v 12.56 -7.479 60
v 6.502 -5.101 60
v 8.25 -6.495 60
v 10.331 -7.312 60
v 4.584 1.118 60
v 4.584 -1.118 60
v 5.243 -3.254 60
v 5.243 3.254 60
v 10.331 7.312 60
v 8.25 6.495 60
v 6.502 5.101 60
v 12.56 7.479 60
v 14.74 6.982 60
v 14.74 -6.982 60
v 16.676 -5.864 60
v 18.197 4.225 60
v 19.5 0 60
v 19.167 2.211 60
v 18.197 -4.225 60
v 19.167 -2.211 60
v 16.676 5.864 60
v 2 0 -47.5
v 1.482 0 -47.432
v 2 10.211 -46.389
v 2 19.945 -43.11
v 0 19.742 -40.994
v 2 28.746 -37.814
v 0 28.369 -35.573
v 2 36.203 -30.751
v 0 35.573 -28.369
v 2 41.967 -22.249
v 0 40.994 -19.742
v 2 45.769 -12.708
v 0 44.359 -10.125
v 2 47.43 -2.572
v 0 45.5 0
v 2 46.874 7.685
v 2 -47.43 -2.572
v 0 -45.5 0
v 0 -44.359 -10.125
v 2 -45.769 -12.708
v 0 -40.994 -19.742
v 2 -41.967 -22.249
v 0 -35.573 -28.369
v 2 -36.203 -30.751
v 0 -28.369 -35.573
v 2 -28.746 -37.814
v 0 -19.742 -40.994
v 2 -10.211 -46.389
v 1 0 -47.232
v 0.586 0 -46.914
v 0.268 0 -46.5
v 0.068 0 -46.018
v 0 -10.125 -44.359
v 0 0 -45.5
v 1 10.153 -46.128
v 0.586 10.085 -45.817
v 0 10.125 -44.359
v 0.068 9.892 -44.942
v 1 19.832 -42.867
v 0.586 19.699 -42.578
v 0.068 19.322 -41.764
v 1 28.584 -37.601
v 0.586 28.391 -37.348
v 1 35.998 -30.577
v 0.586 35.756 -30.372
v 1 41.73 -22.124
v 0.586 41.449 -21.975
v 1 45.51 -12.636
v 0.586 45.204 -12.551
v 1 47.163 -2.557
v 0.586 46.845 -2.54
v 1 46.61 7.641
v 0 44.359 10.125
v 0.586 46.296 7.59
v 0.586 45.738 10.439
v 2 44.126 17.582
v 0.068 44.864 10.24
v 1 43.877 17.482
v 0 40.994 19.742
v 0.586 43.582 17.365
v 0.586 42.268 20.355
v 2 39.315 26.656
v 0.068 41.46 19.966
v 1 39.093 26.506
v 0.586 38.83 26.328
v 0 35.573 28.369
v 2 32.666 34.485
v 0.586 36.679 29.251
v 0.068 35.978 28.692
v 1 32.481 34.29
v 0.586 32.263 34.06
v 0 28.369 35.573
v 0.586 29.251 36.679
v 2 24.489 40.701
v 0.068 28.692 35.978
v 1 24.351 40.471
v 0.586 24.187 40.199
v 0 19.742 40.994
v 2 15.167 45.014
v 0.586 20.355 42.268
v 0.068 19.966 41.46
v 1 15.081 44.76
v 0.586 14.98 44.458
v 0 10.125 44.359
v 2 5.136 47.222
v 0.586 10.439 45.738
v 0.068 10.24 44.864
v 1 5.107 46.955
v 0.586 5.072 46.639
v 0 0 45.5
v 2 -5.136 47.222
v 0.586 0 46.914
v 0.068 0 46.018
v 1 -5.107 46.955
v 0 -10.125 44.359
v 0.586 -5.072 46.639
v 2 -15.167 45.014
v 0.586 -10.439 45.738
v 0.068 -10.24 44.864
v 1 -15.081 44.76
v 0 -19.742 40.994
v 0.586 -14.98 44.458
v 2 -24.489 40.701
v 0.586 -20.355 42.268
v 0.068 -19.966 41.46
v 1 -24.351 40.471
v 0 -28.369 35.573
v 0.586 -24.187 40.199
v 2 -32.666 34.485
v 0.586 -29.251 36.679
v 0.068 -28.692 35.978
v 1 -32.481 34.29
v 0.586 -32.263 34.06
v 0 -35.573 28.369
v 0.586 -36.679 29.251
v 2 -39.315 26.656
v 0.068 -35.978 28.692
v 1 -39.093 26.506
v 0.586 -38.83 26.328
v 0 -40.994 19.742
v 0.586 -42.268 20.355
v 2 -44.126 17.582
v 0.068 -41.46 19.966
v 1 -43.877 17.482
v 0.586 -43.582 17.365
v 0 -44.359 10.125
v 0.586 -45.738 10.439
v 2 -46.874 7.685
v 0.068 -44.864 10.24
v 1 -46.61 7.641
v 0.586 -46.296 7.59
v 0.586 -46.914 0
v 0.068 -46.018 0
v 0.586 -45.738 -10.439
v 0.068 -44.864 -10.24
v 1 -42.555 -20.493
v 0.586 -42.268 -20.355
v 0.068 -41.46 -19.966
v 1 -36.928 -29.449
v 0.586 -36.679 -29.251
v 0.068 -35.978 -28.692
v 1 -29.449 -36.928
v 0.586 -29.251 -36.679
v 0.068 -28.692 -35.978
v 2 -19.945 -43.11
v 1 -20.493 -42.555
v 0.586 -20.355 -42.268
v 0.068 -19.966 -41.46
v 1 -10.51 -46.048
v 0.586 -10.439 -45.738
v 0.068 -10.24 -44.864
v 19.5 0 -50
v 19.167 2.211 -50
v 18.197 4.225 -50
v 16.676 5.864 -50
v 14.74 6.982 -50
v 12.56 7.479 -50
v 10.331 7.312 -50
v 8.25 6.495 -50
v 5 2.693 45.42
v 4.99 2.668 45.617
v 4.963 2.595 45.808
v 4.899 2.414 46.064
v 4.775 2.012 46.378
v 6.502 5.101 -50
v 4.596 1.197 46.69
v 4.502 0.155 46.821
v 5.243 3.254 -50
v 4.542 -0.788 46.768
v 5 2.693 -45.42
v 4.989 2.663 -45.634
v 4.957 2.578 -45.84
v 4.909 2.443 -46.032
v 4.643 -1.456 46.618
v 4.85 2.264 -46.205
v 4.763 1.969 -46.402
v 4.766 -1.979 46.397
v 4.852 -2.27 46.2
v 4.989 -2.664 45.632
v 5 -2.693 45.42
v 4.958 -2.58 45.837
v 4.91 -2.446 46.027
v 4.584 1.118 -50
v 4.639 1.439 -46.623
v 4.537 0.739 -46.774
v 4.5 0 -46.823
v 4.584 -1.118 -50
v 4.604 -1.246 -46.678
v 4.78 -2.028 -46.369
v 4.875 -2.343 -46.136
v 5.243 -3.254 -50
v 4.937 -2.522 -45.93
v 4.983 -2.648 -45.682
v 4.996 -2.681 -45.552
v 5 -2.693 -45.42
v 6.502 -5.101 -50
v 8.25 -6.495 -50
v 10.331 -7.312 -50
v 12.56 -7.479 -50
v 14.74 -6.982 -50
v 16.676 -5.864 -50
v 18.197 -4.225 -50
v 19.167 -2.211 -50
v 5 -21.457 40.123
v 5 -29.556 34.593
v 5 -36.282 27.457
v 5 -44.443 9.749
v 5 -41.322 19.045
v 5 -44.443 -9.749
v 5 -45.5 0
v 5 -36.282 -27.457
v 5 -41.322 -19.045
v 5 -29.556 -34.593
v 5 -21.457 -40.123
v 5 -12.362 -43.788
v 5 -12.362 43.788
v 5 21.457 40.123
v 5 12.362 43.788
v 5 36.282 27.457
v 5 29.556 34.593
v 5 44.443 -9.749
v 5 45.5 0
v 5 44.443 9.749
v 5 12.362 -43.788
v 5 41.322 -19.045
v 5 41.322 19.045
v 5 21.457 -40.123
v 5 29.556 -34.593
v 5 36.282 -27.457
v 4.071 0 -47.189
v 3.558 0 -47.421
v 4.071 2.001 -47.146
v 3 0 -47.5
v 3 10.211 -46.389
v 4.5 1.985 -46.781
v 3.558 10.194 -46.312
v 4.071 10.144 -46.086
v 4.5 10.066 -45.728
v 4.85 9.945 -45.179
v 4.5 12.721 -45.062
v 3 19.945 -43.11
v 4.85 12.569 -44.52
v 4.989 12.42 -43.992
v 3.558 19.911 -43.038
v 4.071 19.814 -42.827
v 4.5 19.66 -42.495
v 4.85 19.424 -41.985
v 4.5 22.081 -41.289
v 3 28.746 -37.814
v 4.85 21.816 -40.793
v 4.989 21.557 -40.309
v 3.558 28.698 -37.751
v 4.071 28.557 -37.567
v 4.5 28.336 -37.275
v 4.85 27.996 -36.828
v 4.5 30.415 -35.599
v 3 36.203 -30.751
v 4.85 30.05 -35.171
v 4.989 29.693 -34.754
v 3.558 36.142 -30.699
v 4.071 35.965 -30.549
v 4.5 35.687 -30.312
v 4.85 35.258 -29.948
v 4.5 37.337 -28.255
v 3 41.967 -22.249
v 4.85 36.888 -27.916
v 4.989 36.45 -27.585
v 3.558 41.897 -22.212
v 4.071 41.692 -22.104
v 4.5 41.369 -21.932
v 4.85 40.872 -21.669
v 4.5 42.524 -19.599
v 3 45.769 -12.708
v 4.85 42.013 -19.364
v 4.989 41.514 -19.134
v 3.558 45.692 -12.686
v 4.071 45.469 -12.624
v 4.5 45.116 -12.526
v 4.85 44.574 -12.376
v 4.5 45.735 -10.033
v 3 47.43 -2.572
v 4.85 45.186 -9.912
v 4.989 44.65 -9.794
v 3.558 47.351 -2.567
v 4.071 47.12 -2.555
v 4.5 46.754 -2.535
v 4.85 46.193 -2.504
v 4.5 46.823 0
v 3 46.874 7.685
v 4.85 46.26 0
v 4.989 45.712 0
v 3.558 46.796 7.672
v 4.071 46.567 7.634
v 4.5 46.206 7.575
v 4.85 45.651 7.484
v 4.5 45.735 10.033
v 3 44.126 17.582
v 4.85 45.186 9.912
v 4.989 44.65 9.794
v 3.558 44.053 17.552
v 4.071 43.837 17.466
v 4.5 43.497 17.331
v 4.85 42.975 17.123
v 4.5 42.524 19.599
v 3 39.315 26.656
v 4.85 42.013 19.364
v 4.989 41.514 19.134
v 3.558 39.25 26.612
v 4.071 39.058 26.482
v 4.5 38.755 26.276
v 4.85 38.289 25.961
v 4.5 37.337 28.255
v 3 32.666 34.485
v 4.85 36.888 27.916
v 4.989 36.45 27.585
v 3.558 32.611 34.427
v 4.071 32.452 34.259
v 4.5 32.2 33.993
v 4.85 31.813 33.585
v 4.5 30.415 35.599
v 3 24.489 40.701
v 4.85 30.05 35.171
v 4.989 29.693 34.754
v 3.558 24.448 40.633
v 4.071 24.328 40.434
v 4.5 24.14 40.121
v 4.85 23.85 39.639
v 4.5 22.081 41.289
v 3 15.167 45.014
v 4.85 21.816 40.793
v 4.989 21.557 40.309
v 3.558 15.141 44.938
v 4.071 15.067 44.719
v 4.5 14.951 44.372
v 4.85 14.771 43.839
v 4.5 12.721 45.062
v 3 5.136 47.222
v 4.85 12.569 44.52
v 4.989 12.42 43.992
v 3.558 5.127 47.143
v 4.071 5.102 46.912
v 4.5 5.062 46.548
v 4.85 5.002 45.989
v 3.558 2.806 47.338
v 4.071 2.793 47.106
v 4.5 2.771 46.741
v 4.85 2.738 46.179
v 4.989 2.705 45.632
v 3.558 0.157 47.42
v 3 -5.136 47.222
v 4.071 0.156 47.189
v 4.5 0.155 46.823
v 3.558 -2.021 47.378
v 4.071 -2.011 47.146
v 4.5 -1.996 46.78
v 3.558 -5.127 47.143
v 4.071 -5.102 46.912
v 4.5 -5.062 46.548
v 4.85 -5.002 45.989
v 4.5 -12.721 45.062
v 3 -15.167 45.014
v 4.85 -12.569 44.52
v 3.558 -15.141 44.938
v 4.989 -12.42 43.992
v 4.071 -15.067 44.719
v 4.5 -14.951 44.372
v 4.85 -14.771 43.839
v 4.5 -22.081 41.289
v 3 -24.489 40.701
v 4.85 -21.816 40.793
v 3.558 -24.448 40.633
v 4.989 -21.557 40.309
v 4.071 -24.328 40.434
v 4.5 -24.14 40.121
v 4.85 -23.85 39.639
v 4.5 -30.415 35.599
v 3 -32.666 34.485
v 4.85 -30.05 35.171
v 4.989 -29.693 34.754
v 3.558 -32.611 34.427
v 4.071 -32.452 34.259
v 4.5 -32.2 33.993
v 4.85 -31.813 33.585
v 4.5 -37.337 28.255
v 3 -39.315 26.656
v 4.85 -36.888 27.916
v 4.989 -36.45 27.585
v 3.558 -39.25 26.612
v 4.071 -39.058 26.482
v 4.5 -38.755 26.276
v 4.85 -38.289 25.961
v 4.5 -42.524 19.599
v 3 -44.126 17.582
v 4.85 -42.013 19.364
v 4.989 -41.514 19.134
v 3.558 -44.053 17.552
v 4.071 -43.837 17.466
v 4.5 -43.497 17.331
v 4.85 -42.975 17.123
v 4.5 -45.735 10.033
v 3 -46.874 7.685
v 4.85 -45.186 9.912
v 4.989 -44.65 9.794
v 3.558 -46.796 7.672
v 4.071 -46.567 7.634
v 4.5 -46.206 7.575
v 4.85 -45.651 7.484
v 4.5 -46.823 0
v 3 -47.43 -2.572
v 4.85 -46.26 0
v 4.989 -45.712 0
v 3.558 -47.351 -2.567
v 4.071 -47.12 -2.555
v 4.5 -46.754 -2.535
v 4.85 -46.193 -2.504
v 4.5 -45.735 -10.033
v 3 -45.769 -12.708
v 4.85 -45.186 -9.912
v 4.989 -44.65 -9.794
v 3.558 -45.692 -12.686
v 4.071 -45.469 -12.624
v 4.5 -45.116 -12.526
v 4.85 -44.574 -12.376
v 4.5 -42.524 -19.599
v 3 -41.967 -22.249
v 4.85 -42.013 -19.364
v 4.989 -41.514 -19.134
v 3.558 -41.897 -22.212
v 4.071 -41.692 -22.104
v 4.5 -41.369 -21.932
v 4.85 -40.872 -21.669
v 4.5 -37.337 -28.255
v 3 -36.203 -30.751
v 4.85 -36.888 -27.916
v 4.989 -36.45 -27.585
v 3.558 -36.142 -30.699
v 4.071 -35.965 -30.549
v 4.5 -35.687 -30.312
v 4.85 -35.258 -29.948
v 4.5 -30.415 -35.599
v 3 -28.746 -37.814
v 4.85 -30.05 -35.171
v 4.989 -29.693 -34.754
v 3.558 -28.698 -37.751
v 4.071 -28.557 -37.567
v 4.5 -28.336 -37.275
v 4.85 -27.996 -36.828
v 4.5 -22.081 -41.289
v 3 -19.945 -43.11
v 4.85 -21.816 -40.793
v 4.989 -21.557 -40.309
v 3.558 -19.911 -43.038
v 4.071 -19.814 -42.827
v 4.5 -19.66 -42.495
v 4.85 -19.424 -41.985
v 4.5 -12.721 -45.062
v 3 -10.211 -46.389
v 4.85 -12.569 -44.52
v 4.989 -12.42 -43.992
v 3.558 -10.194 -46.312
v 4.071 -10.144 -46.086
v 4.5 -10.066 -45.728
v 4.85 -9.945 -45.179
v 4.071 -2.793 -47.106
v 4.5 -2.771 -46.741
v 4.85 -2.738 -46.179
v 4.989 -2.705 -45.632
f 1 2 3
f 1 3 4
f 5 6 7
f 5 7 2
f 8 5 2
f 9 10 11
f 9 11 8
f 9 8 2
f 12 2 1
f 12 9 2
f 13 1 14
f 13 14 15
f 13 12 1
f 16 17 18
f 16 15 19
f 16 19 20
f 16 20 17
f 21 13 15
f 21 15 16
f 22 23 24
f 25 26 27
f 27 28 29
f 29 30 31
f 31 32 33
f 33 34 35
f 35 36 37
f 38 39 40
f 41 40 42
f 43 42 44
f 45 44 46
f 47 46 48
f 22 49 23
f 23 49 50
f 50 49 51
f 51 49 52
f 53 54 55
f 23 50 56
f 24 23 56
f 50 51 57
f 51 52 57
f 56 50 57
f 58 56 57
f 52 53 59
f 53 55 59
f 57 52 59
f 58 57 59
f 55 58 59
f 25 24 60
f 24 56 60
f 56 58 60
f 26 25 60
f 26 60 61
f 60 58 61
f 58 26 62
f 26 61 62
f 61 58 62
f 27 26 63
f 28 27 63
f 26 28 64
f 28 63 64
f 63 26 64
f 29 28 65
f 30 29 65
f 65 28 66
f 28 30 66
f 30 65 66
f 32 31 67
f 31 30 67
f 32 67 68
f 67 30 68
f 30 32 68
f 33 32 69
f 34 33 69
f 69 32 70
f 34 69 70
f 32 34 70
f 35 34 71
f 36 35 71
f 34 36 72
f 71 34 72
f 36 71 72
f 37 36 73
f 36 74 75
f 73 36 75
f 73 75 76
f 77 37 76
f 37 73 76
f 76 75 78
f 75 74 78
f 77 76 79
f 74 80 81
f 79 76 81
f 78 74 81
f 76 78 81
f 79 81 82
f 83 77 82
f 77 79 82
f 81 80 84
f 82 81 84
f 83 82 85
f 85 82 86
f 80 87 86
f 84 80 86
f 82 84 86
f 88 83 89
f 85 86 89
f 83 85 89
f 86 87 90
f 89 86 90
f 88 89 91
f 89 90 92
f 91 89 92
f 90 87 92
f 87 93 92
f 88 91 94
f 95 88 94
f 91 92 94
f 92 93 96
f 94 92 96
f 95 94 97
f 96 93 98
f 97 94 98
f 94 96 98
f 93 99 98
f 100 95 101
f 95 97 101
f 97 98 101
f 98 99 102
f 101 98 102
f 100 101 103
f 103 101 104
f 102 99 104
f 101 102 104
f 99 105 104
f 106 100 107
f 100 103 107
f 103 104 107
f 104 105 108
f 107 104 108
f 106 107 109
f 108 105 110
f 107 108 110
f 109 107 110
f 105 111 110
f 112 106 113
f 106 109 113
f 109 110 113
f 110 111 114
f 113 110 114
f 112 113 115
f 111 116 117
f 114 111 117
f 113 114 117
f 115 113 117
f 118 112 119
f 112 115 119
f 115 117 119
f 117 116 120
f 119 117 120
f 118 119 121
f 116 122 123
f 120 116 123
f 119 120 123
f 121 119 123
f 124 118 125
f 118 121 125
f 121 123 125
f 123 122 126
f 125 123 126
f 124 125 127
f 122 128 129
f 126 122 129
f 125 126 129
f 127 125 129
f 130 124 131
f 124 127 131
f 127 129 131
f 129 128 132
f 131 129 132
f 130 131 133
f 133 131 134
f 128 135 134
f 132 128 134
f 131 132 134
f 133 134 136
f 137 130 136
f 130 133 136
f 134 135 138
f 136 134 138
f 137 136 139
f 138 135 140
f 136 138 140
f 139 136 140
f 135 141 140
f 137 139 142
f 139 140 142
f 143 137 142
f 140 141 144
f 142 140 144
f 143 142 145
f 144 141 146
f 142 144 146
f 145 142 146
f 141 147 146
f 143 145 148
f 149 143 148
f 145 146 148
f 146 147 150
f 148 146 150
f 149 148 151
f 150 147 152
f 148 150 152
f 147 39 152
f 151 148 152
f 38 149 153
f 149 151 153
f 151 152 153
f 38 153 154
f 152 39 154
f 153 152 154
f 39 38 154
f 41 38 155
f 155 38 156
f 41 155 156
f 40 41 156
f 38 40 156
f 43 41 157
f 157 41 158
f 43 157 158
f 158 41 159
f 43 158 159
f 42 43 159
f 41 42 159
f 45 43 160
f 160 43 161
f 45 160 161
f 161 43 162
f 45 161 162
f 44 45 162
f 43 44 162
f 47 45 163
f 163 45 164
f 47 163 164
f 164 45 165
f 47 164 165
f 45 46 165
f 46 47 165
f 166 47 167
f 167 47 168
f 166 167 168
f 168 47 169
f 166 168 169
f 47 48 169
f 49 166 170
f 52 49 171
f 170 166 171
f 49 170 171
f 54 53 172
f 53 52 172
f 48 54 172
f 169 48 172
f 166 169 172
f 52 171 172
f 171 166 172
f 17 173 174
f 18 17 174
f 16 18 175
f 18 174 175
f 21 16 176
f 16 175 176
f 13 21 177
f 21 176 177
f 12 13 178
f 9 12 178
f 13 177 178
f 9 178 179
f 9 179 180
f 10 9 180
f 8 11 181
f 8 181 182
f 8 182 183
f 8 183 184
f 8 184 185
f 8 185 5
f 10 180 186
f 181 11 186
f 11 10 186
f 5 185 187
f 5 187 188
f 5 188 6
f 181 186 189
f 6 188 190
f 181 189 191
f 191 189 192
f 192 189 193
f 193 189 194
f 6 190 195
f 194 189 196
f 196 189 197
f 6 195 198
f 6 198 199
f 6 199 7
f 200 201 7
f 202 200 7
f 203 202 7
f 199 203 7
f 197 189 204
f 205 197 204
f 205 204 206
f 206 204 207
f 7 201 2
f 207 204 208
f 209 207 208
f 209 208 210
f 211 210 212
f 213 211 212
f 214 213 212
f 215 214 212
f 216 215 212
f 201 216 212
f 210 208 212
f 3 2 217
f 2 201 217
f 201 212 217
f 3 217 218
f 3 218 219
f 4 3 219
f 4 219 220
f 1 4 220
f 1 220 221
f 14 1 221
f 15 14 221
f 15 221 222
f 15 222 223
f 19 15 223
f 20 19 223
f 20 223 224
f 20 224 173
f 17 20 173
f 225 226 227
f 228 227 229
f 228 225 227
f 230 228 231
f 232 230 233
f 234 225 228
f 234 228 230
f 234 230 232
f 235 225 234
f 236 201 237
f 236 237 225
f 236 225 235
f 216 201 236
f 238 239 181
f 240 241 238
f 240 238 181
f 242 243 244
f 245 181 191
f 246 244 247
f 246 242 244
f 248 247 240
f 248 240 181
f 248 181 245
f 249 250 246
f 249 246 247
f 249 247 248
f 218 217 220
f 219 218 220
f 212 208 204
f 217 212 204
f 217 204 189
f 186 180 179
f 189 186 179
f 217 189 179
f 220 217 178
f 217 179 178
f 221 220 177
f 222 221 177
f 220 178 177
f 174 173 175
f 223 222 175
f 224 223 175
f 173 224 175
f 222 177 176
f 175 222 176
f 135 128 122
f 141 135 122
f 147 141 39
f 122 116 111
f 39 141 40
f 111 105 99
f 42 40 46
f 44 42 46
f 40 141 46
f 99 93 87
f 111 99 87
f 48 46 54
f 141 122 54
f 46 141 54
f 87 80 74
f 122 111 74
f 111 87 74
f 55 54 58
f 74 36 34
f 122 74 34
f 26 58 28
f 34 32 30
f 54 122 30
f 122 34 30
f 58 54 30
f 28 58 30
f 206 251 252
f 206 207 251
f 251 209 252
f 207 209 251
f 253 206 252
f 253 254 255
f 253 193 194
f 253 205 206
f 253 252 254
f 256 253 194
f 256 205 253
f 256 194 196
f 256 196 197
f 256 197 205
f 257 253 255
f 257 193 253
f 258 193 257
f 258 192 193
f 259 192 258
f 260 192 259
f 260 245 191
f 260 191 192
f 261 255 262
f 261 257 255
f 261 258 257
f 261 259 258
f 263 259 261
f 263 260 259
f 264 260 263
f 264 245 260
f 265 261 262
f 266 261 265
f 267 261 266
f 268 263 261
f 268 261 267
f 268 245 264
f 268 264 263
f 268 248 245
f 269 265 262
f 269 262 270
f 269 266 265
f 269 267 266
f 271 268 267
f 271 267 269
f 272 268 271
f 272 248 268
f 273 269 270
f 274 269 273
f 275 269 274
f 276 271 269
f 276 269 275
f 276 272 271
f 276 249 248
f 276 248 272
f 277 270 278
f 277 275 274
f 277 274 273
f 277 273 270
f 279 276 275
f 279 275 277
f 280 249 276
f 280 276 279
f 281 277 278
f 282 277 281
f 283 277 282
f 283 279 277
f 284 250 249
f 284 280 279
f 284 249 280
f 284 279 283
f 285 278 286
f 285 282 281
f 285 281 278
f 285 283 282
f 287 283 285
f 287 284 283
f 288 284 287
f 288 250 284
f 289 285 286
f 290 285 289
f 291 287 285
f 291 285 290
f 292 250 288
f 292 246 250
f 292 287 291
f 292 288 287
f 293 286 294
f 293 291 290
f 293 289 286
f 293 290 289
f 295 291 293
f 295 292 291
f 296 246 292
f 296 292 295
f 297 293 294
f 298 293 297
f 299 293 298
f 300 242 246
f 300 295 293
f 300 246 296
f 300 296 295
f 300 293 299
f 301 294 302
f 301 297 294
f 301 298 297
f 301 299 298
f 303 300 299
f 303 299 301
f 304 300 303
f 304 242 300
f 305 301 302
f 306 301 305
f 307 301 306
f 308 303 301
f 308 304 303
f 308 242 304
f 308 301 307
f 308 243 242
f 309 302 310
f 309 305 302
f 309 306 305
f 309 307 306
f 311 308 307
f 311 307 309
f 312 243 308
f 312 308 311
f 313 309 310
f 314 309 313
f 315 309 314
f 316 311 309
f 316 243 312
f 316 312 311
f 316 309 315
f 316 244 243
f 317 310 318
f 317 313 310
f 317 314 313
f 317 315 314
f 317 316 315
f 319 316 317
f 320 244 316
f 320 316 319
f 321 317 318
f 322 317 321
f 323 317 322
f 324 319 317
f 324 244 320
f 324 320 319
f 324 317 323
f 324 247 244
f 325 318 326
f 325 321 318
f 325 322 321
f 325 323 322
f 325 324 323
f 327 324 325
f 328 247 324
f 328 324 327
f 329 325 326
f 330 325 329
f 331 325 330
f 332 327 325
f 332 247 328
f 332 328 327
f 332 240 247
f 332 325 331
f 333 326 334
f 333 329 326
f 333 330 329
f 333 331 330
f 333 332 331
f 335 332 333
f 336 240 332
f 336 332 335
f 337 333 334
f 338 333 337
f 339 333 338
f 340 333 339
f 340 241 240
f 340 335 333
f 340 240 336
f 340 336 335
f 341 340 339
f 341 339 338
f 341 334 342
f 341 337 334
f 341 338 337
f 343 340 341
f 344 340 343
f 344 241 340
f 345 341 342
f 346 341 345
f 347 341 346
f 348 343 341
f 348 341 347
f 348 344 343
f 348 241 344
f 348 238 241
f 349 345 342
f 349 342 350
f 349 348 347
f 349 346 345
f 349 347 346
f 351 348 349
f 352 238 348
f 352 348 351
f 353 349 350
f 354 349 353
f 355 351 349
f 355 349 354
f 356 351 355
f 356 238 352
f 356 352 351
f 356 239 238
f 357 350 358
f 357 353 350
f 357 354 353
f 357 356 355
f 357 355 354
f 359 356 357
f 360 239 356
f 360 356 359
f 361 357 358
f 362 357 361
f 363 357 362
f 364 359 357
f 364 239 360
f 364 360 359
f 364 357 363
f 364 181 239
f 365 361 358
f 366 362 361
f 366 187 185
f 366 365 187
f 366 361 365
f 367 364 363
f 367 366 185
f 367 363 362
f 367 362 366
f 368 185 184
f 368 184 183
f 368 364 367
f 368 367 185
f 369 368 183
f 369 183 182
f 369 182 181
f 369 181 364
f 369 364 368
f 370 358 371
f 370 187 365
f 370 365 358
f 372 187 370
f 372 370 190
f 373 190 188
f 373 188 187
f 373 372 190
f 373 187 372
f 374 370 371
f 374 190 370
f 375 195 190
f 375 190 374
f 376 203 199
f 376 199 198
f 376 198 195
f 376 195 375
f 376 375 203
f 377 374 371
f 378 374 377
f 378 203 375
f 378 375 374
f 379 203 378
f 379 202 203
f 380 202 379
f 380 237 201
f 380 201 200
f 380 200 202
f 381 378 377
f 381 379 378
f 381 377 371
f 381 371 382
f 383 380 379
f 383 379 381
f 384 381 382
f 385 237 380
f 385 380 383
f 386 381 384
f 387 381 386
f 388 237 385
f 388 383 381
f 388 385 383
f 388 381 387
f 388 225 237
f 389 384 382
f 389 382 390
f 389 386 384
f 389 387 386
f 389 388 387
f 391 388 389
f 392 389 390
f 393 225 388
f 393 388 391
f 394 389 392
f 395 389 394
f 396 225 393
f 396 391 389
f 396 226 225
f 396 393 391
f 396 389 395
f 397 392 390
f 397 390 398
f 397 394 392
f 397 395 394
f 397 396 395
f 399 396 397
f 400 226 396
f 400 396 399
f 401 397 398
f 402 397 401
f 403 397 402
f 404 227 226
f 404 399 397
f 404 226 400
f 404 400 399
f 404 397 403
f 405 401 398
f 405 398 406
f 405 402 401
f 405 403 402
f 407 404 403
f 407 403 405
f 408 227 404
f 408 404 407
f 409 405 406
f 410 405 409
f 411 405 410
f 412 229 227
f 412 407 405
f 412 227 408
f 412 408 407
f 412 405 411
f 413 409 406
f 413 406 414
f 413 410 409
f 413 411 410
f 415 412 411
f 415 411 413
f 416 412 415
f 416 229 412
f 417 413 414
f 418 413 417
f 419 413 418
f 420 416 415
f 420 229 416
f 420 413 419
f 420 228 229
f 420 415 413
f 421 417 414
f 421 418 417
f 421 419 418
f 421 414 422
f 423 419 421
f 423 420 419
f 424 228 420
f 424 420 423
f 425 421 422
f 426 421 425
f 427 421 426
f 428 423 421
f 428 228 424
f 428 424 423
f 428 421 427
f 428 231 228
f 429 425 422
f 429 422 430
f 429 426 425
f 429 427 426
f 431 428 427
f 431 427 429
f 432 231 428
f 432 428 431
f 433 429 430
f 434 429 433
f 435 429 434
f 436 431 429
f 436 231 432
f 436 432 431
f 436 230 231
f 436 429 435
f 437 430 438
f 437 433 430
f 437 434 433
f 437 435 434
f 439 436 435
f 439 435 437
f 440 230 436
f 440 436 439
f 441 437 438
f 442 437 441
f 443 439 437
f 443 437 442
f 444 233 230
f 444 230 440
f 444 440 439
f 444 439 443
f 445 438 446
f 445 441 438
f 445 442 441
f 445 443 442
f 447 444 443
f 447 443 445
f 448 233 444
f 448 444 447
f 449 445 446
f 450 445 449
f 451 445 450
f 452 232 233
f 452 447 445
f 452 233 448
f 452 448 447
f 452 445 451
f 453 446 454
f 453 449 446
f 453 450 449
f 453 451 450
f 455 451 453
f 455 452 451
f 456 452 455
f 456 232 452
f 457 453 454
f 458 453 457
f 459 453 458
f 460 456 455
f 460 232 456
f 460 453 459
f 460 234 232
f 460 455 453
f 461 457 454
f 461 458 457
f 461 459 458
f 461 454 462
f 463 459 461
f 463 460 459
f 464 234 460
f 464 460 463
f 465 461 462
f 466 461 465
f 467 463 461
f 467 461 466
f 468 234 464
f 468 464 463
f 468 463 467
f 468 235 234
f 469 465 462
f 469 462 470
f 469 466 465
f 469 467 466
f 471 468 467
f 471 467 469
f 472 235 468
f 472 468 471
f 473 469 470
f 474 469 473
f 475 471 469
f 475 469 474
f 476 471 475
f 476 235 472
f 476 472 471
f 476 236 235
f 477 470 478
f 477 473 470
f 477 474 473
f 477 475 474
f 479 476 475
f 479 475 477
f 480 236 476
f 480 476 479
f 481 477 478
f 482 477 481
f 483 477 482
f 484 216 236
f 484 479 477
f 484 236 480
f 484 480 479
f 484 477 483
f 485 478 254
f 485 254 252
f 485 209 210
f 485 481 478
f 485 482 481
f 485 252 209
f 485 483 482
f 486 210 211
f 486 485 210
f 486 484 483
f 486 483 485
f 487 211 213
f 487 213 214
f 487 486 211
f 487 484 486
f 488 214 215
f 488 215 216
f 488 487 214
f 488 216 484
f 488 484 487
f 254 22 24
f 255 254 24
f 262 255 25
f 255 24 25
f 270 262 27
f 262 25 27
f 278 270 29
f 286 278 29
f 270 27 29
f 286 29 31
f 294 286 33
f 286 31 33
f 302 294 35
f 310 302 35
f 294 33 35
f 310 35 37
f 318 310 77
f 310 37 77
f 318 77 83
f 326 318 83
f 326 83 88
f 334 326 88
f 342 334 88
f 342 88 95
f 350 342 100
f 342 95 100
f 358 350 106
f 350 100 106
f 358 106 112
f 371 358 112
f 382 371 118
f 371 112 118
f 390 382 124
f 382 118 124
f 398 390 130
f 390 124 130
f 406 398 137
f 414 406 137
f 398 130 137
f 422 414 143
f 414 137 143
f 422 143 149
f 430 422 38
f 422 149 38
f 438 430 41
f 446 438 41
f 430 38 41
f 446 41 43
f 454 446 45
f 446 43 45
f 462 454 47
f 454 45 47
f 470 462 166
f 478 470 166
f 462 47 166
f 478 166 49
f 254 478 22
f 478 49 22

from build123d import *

# Parameters (mm, degrees)
SKETCH1_R                = 47.5
BOSS_EXTRUDE1_DEPTH      = 5
FILLET1_R                = 2
BOSS_EXTRUDE2_DEPTH      = 60
BOSS_EXTRUDE2_DEPTH_BACK = 50
SKETCH2_R                = 7.5


with BuildPart() as part:
    # Sketch1 → Boss-Extrude1 (new body)
    with BuildSketch(Plane(origin=(0, 0, 0), x_dir=(0, 0, -1), z_dir=(1, 0, 0))):
        Circle(SKETCH1_R)
    extrude(amount=BOSS_EXTRUDE1_DEPTH)

    # Fillet1
    fillet1_edges = [part.edges().sort_by_distance(p)[0] for p in [
        (0, 0, 47.5),
        (5, 0, 47.5),
    ]]
    fillet(fillet1_edges, radius=FILLET1_R)

    # Sketch2 → Boss-Extrude2 (add, two sides: drawn at the far end of the back side and taken through both)
    with BuildSketch(Plane.XY.offset(-BOSS_EXTRUDE2_DEPTH_BACK)):
        with Locations((12, 0)):
            Circle(SKETCH2_R)
    extrude(amount=BOSS_EXTRUDE2_DEPTH + BOSS_EXTRUDE2_DEPTH_BACK)


solid = part.part
